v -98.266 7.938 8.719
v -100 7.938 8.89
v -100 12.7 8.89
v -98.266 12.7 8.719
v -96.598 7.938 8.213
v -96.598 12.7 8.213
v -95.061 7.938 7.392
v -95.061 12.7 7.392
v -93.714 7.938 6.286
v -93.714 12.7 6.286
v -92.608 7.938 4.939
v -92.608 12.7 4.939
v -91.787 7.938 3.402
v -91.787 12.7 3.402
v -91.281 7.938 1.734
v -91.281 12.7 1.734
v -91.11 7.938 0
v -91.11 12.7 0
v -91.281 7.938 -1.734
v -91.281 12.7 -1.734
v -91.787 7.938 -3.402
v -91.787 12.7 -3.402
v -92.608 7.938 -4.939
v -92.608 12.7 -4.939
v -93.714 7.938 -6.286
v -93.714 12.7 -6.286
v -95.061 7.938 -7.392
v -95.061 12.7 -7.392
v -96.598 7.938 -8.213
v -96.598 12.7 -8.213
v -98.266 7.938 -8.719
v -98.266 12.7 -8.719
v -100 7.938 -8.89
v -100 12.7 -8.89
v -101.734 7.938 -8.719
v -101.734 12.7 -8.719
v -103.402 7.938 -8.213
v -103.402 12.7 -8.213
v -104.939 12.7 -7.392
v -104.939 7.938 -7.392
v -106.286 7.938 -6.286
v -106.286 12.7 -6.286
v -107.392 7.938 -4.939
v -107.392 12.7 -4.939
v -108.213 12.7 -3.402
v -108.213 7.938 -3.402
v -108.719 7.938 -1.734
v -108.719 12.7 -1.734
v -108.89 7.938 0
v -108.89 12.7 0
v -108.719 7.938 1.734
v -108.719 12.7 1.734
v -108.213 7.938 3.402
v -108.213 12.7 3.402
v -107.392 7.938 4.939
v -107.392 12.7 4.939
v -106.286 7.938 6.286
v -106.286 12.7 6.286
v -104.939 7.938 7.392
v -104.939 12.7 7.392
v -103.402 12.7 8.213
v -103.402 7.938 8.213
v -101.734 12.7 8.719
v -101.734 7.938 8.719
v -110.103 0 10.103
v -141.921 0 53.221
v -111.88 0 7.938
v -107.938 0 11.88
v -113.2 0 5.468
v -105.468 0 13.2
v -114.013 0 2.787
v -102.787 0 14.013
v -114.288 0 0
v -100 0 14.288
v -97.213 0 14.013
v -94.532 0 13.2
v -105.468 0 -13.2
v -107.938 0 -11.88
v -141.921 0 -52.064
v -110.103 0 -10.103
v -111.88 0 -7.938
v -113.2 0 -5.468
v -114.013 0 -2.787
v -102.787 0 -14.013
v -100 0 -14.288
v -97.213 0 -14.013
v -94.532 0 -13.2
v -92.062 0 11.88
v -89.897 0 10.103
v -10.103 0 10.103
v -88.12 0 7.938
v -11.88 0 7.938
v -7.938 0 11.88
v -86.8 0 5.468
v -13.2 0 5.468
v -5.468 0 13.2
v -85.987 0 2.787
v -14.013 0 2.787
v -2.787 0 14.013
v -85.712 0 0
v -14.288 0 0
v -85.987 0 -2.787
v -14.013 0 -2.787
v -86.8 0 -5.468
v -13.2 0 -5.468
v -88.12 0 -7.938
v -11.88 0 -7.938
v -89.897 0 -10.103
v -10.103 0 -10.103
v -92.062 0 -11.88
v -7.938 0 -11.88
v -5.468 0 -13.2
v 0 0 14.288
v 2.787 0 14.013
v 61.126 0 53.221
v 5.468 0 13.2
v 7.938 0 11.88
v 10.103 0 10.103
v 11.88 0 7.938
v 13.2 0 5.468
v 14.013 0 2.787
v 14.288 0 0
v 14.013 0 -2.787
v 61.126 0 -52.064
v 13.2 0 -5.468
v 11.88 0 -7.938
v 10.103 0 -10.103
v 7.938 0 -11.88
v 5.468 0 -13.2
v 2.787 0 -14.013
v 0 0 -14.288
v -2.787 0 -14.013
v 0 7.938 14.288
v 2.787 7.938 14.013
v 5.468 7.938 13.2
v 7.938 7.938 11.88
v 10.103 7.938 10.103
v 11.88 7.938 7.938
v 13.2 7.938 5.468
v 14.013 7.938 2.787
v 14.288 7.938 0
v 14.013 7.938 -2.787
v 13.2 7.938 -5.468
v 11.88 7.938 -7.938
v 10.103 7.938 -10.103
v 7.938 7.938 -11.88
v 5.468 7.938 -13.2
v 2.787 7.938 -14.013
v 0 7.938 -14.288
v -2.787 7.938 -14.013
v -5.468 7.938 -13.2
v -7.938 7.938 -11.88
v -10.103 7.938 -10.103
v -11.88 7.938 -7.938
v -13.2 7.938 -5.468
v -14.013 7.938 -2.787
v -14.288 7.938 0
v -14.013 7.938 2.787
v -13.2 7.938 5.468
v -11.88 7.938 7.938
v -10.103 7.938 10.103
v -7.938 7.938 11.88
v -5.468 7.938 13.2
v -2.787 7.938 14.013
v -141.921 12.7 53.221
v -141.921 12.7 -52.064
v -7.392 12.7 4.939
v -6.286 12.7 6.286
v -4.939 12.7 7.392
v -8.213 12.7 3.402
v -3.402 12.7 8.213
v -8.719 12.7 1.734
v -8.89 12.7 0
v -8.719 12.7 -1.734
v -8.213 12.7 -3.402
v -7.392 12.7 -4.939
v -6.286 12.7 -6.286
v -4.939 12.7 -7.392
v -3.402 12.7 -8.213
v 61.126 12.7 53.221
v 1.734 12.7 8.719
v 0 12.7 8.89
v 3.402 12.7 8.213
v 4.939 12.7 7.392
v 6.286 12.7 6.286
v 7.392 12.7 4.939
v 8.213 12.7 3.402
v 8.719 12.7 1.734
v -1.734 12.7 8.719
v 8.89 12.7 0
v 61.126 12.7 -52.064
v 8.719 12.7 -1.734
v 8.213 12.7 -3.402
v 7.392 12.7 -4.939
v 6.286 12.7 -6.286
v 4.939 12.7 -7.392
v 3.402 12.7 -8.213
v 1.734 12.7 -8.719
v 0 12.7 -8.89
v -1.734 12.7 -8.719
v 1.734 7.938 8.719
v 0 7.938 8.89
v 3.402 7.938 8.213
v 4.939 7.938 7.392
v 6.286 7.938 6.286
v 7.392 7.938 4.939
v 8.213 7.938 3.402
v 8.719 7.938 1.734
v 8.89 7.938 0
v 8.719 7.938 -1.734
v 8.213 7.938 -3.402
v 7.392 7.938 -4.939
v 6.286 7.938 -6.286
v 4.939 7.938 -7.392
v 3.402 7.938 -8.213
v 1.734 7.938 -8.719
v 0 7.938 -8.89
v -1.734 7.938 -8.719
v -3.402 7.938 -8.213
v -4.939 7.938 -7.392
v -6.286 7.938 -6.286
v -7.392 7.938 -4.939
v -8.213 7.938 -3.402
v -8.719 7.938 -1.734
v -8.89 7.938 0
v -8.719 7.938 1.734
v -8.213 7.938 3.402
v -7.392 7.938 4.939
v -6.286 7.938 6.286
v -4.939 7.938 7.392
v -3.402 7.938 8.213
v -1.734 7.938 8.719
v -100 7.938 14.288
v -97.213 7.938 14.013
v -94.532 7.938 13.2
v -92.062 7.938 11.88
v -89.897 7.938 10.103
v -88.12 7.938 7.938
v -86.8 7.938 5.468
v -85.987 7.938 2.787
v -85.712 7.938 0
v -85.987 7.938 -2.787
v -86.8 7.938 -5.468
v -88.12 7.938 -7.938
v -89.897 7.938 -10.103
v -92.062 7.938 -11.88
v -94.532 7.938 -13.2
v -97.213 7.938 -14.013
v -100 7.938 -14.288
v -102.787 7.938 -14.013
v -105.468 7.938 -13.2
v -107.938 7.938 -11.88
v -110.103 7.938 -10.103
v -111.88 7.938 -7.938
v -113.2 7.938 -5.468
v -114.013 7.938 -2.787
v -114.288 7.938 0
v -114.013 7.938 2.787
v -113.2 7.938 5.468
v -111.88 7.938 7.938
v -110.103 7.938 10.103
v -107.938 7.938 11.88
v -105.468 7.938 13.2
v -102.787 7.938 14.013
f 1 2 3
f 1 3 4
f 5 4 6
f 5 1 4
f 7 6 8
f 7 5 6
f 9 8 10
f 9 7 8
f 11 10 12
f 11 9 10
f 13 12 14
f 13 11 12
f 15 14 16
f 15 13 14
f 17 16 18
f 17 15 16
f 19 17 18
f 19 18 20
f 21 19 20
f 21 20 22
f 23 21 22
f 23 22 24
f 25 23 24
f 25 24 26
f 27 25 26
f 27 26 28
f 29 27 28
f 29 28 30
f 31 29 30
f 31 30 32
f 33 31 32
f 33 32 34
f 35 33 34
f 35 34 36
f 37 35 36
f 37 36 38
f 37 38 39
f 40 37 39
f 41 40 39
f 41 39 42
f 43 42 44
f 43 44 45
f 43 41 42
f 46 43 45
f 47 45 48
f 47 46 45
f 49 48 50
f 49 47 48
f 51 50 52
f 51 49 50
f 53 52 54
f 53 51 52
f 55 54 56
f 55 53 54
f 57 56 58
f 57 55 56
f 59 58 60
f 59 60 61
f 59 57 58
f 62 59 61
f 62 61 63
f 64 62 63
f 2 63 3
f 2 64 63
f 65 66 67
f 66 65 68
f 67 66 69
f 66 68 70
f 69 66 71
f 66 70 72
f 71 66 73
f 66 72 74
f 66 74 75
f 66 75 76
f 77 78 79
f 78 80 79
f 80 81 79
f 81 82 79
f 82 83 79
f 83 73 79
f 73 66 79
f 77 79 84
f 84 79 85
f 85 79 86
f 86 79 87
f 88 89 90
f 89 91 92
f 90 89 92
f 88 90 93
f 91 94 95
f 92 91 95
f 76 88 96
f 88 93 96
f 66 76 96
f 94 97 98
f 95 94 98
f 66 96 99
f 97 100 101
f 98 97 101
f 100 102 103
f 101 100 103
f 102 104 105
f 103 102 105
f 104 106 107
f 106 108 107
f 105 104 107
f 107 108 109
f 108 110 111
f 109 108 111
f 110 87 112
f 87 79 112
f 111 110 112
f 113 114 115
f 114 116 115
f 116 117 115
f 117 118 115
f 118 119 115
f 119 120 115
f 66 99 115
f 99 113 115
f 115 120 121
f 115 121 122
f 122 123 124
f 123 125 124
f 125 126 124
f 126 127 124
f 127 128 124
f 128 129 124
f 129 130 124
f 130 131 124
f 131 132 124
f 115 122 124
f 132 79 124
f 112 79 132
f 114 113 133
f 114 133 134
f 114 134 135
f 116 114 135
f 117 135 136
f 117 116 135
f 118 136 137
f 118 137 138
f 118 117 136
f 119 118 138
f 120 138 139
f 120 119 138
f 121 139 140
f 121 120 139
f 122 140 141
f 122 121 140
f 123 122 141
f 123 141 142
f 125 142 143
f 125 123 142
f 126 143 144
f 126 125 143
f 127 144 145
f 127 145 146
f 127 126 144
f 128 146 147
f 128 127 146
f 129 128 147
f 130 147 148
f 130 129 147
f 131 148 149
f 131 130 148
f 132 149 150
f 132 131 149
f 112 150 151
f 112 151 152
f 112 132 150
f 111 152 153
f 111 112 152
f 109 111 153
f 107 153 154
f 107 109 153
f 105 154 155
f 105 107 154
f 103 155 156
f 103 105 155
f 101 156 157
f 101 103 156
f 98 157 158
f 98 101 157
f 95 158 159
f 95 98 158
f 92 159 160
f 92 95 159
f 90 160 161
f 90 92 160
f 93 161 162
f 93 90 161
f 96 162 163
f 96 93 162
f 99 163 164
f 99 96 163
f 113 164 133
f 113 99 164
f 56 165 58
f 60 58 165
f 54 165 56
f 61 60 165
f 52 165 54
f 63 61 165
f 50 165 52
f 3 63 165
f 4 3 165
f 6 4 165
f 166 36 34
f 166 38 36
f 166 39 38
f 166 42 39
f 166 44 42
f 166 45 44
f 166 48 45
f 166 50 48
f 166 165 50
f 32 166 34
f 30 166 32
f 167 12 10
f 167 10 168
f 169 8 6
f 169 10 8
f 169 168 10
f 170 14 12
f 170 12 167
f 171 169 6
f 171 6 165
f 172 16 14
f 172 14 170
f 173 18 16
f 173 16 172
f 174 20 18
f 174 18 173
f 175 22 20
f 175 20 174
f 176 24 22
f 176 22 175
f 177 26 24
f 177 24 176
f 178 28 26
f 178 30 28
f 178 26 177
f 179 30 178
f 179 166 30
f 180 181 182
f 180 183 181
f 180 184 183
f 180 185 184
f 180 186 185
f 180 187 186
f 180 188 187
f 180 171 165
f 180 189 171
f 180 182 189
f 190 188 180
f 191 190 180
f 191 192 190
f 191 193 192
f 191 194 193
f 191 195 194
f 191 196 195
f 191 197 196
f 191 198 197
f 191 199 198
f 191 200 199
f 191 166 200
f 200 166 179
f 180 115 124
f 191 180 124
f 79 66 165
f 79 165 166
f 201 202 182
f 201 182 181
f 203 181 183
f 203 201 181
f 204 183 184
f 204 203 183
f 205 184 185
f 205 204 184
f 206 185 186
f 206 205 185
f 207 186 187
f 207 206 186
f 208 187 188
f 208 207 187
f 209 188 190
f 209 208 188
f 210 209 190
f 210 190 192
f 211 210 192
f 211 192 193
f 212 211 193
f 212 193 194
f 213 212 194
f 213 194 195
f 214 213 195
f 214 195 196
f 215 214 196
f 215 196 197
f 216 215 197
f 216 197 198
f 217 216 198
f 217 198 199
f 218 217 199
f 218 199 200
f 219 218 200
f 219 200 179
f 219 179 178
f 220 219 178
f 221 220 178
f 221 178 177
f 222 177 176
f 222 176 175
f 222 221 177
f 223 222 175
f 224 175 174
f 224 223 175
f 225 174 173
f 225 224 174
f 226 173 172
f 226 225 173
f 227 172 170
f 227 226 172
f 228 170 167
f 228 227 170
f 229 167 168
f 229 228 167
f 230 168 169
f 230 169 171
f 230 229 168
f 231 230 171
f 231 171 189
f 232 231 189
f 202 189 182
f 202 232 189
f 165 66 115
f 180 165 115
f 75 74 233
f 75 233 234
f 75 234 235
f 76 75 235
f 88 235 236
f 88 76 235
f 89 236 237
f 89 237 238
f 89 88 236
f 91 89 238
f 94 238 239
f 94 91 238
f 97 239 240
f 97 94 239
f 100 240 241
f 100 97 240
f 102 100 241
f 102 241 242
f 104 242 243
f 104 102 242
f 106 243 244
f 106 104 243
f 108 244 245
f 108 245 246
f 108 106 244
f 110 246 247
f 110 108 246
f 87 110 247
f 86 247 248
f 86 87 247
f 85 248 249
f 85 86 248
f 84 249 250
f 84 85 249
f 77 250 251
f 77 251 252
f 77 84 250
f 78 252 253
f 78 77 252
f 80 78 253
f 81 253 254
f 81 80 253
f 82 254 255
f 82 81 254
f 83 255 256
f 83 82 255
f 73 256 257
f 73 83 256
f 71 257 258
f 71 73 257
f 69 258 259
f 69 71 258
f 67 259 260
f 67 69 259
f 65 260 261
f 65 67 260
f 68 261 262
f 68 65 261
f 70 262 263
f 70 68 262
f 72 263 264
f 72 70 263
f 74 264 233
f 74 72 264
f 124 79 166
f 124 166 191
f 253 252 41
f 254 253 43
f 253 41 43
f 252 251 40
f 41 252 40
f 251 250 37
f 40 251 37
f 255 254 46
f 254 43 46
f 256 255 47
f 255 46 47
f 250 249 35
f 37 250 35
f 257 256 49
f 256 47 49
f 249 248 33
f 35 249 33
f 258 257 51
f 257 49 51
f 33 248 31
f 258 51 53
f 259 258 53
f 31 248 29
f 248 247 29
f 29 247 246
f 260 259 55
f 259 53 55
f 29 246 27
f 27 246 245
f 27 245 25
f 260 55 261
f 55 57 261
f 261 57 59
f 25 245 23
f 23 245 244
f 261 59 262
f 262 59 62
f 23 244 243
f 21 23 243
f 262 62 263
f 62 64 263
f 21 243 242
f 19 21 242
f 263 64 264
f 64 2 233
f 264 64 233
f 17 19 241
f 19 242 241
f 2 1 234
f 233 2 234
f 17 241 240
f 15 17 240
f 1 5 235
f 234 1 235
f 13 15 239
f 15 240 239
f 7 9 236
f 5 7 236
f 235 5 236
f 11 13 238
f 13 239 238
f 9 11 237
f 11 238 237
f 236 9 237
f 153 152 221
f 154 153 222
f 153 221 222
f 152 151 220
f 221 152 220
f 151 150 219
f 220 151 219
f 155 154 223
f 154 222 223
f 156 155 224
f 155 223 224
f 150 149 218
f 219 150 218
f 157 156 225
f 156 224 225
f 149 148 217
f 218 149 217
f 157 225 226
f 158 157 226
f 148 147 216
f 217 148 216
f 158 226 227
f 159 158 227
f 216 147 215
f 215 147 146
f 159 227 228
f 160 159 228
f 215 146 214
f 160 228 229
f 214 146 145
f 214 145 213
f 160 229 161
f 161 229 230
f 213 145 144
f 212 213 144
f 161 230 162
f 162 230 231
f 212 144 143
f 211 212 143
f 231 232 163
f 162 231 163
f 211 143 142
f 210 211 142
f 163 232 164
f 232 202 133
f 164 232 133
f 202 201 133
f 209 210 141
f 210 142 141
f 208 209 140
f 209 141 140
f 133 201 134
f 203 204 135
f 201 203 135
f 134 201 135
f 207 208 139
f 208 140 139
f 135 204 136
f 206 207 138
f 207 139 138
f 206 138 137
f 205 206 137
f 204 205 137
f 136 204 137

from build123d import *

# Parameters (mm, degrees)
SKETCH1_W           = 203.047872021
SKETCH1_H           = 105.284081788
SKETCH1_R           = 8.89
BOSS_EXTRUDE1_DEPTH = 12.7
SKETCH2_R           = 14.2875
CUT_EXTRUDE1_DEPTH  = 7.9375


with BuildPart() as part:
    # Sketch1 → Boss-Extrude1 (new body)
    with BuildSketch(Plane(origin=(0, 0, 0), x_dir=(1, 0, 0), z_dir=(0, 1, 0))):
        with Locations((-40.397463616, -0.578483966)):
            Rectangle(SKETCH1_W, SKETCH1_H)
        with Locations(Location((-100, 0, 0), (0, 0, 270))):
            Circle(SKETCH1_R, mode=Mode.SUBTRACT)
        with Locations(Location((0, 0, 0), (0, 0, 270))):
            Circle(SKETCH1_R, mode=Mode.SUBTRACT)
    extrude(amount=BOSS_EXTRUDE1_DEPTH)

    # Sketch2 → Cut-Extrude1 (cut)
    with BuildSketch(Plane(origin=(0, 0, 0), x_dir=(1, 0, 0), z_dir=(0, 1, 0))):
        with Locations(Location((-100, 0, 0), (0, 0, 270))):
            Circle(SKETCH2_R)
        with Locations(Location((0, 0, 0), (0, 0, 270))):
            Circle(SKETCH2_R)
    extrude(amount=CUT_EXTRUDE1_DEPTH, mode=Mode.SUBTRACT)


solid = part.part
